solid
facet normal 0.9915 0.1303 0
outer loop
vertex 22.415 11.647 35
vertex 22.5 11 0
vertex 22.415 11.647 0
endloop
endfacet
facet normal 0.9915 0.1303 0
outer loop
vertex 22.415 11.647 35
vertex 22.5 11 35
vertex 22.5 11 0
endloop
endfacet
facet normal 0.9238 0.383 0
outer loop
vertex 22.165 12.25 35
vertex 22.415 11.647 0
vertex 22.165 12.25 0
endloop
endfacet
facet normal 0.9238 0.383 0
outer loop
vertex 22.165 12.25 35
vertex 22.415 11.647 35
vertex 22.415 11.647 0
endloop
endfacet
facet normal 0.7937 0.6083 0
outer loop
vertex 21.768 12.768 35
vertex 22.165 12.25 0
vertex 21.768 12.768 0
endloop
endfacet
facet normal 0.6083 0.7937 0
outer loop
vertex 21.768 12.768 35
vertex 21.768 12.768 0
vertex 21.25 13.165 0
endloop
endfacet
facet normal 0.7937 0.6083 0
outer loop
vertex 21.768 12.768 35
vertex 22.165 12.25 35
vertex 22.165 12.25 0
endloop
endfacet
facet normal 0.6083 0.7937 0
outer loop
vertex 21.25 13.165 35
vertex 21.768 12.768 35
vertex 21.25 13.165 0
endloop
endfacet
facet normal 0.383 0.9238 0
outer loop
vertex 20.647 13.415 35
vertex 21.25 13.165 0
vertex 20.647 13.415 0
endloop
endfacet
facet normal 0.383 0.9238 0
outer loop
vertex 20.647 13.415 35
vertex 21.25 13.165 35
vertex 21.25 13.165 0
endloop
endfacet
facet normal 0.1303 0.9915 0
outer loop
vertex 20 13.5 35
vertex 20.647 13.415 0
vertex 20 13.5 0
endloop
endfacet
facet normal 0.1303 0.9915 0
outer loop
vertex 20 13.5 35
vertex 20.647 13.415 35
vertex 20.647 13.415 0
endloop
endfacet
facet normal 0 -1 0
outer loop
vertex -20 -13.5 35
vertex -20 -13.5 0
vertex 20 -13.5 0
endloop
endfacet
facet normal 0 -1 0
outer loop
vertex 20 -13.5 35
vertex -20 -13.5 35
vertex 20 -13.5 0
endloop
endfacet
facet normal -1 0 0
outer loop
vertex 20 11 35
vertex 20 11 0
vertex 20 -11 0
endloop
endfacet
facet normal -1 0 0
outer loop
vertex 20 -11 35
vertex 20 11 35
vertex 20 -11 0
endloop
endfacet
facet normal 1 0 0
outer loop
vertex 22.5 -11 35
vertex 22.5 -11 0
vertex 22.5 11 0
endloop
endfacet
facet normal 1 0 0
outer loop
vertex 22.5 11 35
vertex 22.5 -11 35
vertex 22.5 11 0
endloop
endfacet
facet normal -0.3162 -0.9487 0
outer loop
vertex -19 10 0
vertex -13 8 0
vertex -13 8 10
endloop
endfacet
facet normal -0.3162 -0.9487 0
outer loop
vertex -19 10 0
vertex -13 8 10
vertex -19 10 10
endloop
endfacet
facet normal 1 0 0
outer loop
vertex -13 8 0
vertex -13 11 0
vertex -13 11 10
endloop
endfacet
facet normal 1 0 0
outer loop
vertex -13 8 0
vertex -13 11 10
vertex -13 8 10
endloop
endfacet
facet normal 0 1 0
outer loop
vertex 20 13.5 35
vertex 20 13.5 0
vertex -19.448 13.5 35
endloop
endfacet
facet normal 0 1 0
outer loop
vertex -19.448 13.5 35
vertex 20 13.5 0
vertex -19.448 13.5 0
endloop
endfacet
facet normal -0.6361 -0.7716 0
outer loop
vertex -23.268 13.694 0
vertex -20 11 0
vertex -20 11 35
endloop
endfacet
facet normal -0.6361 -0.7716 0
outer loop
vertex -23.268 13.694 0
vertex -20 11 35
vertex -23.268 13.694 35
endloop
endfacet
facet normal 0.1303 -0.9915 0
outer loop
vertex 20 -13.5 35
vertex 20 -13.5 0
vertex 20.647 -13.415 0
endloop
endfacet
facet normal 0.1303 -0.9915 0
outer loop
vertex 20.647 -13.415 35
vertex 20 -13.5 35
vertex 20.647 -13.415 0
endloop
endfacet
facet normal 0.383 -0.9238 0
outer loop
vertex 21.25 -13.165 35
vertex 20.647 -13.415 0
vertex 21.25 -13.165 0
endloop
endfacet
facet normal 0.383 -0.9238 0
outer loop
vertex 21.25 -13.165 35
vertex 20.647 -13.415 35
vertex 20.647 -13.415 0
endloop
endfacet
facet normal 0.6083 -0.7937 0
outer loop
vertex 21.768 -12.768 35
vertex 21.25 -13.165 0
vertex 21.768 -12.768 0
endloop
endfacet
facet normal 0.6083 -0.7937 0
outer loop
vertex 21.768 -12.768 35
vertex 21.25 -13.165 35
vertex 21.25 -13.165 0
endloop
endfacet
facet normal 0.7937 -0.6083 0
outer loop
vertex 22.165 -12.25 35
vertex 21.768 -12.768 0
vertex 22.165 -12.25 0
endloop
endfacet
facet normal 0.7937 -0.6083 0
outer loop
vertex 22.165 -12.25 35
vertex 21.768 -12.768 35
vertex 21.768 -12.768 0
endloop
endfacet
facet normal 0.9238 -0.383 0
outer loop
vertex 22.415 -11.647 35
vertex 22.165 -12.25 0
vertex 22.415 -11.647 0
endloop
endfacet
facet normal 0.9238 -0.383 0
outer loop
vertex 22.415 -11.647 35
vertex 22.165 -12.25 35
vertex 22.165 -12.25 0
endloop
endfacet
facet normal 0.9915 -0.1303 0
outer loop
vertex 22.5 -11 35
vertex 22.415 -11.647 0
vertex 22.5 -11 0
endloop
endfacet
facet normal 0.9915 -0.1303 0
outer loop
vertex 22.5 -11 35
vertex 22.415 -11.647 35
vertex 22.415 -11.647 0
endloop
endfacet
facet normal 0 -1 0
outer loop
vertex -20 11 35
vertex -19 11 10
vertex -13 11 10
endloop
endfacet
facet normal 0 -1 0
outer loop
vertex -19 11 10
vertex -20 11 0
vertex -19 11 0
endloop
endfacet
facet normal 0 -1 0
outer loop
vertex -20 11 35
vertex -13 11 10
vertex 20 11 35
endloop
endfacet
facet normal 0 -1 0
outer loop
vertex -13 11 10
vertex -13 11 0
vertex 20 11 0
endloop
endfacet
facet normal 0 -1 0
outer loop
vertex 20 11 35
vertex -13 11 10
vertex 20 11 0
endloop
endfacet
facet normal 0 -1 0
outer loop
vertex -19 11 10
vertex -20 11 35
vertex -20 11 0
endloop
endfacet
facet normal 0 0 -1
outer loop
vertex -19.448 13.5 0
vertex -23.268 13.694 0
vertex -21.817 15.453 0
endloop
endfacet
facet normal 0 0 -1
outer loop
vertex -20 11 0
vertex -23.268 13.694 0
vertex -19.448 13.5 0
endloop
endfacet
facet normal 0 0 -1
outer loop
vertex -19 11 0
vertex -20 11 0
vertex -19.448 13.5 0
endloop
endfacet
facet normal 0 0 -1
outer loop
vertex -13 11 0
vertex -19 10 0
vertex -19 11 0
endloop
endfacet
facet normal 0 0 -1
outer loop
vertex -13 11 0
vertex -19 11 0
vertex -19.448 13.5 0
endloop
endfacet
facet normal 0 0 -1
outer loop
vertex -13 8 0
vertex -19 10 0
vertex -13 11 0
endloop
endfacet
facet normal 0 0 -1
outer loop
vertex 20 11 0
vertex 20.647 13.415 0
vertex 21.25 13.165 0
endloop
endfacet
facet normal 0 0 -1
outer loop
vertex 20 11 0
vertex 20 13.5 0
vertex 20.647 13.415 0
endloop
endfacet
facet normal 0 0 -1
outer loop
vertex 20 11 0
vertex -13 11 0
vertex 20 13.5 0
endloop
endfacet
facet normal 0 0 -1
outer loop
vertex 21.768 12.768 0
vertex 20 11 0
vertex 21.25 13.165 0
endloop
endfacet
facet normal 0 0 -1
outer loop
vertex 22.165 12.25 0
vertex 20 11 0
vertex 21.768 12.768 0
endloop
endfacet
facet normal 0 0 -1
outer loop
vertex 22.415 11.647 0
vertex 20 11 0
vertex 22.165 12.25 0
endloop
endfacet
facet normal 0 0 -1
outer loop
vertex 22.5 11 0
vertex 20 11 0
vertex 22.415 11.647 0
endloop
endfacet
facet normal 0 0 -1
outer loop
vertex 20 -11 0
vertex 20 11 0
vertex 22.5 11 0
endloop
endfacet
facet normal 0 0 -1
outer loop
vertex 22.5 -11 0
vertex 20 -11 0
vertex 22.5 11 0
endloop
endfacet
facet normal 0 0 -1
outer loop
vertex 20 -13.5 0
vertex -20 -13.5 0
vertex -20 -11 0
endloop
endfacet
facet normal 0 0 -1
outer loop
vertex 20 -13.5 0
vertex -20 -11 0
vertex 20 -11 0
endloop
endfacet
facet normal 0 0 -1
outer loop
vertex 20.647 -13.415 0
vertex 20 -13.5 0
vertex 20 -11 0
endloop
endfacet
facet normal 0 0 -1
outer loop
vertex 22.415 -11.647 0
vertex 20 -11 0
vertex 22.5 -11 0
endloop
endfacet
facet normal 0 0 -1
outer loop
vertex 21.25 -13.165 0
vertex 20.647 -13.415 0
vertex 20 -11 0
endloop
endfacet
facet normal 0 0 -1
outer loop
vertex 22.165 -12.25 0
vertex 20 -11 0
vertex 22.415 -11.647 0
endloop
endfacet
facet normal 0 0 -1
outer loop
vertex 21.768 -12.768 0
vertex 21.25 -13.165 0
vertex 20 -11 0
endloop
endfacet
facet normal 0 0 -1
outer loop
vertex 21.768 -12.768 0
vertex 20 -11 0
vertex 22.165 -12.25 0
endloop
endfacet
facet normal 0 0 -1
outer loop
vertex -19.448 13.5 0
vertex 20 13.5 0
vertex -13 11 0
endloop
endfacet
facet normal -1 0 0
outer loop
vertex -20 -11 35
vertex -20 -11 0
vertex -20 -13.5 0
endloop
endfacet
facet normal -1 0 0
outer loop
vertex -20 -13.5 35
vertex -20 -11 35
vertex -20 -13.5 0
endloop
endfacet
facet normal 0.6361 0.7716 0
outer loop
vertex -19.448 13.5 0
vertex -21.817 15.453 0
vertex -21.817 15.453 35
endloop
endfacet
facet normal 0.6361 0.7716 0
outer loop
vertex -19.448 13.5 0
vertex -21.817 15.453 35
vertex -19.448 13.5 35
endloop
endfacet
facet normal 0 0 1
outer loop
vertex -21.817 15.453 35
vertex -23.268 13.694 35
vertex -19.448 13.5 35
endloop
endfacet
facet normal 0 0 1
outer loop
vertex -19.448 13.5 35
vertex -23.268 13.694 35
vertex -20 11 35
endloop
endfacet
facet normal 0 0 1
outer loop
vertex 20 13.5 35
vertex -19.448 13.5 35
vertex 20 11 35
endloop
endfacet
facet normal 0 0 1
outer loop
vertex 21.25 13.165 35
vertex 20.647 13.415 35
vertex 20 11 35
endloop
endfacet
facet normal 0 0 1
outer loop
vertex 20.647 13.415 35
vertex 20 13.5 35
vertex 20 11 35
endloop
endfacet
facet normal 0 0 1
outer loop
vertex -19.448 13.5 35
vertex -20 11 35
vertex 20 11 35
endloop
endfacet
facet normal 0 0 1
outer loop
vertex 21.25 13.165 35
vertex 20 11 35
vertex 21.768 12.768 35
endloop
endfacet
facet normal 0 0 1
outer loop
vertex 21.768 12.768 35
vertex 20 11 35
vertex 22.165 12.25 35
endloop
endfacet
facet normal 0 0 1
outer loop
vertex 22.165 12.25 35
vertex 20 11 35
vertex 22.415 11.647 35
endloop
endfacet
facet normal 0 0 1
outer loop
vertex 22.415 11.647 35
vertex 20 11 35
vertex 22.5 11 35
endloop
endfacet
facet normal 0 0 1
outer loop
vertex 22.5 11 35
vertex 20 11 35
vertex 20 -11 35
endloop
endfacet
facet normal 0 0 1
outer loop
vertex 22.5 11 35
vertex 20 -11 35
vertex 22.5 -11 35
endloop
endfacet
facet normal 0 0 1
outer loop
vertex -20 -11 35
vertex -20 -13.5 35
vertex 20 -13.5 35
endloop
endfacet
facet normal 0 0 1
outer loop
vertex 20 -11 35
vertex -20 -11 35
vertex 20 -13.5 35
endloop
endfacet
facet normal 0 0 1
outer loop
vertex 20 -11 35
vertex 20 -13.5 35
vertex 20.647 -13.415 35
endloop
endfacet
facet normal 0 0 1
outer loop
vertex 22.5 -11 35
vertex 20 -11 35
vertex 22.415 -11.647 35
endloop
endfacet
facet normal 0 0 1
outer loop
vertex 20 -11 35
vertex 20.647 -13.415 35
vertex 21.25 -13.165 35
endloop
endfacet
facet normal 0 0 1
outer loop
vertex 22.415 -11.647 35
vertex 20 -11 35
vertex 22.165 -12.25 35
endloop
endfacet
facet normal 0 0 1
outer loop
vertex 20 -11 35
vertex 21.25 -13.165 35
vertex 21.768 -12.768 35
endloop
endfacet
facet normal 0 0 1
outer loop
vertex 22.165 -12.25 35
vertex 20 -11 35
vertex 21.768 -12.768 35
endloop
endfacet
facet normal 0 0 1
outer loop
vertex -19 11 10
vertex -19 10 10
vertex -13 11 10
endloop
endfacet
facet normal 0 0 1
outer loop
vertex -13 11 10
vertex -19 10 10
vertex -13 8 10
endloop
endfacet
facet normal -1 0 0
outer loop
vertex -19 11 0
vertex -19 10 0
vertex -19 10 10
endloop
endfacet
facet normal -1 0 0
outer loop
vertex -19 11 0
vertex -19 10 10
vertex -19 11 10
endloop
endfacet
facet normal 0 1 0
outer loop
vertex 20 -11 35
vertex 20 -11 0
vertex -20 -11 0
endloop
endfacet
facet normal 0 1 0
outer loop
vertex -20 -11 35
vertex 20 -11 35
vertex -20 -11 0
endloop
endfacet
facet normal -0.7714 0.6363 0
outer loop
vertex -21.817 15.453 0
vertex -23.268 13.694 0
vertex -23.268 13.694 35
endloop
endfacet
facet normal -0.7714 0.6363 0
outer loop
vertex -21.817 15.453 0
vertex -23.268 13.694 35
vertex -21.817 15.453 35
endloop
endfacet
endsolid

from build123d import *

# Parameters (mm, degrees)
F1_DEPTH = 35
F3_DEPTH = 10
F5_DEPTH = 35
F6_R     = 2.5


with BuildPart() as f1:
    # F0 (on Top) → F1 (new body)
    with BuildSketch(Plane.XY):
        Polygon((-20, 13.5), (-20, 11), (20, 11), (20, -11), (-20, -11), (-20, -13.5), (22.5, -13.5), (22.5, 13.5), align=None)
    extrude(amount=F1_DEPTH)

    # F2 (on face) → F3 (join)
    with BuildSketch(Plane(origin=(0, 0, 0), x_dir=(1, 0, 0), z_dir=(0, 0, -1))):
        Polygon((-19, -11), (-13, -11), (-13, -8), (-19, -10), align=None)
    extrude(amount=-F3_DEPTH)

    # F4 (on face) → F5 (join)
    with BuildSketch(Plane(origin=(0, 0, 0), x_dir=(1, 0, 0), z_dir=(0, 0, -1))):
        Polygon((-20, -13.5), (-20, -11), (-23.267881, -13.694357), (-21.817495, -15.453473), (-19.448203, -13.5), align=None)
    extrude(amount=-F5_DEPTH)

    # F6
    f6_edges = [f1.edges().sort_by_distance(p)[0] for p in [
        (22.5, 13.5, 17.5),
        (22.5, -13.5, 17.5),
    ]]
    fillet(f6_edges, radius=F6_R)


solid = f1.part
